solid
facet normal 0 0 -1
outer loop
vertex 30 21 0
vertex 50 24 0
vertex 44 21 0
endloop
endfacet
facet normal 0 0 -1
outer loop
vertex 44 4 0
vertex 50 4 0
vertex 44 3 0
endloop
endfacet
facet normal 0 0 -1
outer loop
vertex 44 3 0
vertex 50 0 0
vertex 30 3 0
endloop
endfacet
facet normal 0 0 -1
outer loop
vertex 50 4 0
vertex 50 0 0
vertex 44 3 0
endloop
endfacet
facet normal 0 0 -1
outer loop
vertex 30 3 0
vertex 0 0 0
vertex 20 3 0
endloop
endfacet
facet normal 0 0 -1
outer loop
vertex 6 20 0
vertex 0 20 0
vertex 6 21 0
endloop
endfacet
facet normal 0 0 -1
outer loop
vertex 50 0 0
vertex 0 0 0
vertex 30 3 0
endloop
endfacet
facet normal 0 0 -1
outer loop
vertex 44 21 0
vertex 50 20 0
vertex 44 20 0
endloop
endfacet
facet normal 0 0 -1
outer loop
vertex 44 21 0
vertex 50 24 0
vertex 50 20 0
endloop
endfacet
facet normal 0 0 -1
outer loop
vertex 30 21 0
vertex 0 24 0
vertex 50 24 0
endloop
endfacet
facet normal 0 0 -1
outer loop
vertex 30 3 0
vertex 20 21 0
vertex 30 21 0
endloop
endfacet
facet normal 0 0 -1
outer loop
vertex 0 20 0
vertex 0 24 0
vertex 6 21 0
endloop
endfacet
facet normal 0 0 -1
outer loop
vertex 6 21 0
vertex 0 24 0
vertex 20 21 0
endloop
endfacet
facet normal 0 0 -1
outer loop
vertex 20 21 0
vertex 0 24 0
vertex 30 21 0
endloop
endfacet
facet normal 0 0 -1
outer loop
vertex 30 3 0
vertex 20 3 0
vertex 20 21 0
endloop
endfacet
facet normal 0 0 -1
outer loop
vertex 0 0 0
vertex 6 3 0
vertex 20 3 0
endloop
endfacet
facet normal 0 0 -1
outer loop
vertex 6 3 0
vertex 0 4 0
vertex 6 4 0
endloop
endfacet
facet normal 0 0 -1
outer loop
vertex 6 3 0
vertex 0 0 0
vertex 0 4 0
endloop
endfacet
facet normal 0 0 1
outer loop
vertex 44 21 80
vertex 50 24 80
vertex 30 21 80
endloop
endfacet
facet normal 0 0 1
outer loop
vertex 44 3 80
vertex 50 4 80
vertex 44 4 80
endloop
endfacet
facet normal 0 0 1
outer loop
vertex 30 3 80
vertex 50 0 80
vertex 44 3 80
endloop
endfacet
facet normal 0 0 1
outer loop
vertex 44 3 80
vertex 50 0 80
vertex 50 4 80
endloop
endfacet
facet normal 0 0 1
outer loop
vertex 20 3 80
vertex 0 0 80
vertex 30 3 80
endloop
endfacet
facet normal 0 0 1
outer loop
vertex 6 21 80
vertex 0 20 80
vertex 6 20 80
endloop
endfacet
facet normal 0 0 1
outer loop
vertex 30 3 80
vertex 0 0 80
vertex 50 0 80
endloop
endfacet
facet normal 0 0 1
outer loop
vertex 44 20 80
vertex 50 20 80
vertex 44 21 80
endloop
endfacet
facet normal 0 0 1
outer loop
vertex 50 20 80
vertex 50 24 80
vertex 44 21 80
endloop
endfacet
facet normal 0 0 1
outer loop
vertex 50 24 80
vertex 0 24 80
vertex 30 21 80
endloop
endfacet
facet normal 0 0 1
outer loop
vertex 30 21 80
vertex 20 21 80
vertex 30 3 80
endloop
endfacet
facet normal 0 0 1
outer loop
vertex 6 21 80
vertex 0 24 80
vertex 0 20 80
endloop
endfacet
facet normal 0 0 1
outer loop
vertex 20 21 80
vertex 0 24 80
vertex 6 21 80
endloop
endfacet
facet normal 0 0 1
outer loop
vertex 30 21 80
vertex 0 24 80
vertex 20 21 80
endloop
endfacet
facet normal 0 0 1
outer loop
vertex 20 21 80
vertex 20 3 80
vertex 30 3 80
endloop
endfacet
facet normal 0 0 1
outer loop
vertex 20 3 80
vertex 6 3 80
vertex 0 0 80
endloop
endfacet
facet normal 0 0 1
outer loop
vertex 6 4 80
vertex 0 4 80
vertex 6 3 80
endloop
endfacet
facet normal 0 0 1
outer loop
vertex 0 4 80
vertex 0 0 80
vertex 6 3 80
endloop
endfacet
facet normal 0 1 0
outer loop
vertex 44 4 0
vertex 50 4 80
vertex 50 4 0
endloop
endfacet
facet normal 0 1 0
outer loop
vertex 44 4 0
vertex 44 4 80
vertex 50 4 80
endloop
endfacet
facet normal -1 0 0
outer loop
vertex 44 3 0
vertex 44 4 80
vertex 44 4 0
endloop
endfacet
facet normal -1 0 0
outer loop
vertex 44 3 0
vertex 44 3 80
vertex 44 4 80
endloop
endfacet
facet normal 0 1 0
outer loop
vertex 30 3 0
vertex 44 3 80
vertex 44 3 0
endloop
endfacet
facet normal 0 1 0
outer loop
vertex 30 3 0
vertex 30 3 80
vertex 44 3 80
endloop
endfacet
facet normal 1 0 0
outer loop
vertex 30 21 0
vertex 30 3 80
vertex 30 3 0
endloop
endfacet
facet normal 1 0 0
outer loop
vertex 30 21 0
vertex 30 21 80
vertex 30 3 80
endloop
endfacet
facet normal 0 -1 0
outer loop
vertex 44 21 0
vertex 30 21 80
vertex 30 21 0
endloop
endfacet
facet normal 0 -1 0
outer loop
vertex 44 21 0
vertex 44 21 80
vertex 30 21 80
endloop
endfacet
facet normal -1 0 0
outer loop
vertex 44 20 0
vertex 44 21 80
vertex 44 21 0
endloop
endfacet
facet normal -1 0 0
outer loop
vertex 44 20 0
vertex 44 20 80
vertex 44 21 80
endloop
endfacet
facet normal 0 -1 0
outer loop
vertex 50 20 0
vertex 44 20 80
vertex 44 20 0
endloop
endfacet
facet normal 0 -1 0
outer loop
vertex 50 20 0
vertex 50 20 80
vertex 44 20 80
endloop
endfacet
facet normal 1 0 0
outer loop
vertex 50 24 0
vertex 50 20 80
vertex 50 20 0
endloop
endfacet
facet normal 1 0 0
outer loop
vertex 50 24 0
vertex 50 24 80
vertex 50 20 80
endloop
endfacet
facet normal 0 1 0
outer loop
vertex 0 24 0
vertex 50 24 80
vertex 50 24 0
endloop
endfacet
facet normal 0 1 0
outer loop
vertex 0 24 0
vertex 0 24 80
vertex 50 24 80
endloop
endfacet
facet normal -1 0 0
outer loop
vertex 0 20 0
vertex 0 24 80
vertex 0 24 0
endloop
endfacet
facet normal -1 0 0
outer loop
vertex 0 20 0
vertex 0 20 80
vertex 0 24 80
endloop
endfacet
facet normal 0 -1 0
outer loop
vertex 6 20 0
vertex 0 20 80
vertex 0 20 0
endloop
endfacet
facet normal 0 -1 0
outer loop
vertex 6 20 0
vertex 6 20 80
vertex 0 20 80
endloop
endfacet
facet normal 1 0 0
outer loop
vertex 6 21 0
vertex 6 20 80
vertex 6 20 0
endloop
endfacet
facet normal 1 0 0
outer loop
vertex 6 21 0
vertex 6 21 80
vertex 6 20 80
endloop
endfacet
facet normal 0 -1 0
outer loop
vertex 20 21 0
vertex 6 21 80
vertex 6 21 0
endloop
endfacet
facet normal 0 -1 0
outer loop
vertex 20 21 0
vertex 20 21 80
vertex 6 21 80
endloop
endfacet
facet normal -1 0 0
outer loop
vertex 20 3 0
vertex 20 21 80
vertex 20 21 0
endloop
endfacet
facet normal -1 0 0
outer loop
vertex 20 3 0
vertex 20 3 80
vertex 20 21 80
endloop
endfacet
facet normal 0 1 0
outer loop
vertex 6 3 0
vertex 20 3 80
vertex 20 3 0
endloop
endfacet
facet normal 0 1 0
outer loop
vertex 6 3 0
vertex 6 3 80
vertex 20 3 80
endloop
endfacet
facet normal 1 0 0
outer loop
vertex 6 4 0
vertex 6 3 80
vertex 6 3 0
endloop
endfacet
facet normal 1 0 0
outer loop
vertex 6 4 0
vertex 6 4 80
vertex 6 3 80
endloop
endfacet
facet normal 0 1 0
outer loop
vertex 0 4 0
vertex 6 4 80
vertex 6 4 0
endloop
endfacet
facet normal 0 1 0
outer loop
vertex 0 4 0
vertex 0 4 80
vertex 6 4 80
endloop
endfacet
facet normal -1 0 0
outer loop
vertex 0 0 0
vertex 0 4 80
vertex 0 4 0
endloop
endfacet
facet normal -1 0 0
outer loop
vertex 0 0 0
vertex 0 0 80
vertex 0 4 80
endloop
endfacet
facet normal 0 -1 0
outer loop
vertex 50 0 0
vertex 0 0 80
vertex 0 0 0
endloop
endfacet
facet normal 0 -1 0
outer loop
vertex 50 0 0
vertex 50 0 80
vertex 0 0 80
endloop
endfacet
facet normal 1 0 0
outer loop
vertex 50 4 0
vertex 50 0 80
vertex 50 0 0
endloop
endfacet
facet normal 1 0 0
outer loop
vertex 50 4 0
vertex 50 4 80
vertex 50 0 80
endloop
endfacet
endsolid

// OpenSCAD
$fn = 32;

// ----------------------------------------------------------------------
// T-slot rail: 50 x 24 mm section, 80 mm long
// ----------------------------------------------------------------------

// --- parameters (mm) ---
profile_height = 80;      // extrusion height
profile_points = 20;      // points of the closed outline

profile = [[0, 0], [50, 0], [50, 4], [44, 4], [44, 3], [30, 3], [30, 21], [44, 21], [44, 20], [50, 20], [50, 24], [0, 24], [0, 20], [6, 20], [6, 21], [20, 21], [20, 3], [6, 3], [6, 4], [0, 4]];  // single closed polygon, 20 points, counter clockwise

// --- the one profile operation ---
linear_extrude(height = profile_height) polygon(points = profile);
